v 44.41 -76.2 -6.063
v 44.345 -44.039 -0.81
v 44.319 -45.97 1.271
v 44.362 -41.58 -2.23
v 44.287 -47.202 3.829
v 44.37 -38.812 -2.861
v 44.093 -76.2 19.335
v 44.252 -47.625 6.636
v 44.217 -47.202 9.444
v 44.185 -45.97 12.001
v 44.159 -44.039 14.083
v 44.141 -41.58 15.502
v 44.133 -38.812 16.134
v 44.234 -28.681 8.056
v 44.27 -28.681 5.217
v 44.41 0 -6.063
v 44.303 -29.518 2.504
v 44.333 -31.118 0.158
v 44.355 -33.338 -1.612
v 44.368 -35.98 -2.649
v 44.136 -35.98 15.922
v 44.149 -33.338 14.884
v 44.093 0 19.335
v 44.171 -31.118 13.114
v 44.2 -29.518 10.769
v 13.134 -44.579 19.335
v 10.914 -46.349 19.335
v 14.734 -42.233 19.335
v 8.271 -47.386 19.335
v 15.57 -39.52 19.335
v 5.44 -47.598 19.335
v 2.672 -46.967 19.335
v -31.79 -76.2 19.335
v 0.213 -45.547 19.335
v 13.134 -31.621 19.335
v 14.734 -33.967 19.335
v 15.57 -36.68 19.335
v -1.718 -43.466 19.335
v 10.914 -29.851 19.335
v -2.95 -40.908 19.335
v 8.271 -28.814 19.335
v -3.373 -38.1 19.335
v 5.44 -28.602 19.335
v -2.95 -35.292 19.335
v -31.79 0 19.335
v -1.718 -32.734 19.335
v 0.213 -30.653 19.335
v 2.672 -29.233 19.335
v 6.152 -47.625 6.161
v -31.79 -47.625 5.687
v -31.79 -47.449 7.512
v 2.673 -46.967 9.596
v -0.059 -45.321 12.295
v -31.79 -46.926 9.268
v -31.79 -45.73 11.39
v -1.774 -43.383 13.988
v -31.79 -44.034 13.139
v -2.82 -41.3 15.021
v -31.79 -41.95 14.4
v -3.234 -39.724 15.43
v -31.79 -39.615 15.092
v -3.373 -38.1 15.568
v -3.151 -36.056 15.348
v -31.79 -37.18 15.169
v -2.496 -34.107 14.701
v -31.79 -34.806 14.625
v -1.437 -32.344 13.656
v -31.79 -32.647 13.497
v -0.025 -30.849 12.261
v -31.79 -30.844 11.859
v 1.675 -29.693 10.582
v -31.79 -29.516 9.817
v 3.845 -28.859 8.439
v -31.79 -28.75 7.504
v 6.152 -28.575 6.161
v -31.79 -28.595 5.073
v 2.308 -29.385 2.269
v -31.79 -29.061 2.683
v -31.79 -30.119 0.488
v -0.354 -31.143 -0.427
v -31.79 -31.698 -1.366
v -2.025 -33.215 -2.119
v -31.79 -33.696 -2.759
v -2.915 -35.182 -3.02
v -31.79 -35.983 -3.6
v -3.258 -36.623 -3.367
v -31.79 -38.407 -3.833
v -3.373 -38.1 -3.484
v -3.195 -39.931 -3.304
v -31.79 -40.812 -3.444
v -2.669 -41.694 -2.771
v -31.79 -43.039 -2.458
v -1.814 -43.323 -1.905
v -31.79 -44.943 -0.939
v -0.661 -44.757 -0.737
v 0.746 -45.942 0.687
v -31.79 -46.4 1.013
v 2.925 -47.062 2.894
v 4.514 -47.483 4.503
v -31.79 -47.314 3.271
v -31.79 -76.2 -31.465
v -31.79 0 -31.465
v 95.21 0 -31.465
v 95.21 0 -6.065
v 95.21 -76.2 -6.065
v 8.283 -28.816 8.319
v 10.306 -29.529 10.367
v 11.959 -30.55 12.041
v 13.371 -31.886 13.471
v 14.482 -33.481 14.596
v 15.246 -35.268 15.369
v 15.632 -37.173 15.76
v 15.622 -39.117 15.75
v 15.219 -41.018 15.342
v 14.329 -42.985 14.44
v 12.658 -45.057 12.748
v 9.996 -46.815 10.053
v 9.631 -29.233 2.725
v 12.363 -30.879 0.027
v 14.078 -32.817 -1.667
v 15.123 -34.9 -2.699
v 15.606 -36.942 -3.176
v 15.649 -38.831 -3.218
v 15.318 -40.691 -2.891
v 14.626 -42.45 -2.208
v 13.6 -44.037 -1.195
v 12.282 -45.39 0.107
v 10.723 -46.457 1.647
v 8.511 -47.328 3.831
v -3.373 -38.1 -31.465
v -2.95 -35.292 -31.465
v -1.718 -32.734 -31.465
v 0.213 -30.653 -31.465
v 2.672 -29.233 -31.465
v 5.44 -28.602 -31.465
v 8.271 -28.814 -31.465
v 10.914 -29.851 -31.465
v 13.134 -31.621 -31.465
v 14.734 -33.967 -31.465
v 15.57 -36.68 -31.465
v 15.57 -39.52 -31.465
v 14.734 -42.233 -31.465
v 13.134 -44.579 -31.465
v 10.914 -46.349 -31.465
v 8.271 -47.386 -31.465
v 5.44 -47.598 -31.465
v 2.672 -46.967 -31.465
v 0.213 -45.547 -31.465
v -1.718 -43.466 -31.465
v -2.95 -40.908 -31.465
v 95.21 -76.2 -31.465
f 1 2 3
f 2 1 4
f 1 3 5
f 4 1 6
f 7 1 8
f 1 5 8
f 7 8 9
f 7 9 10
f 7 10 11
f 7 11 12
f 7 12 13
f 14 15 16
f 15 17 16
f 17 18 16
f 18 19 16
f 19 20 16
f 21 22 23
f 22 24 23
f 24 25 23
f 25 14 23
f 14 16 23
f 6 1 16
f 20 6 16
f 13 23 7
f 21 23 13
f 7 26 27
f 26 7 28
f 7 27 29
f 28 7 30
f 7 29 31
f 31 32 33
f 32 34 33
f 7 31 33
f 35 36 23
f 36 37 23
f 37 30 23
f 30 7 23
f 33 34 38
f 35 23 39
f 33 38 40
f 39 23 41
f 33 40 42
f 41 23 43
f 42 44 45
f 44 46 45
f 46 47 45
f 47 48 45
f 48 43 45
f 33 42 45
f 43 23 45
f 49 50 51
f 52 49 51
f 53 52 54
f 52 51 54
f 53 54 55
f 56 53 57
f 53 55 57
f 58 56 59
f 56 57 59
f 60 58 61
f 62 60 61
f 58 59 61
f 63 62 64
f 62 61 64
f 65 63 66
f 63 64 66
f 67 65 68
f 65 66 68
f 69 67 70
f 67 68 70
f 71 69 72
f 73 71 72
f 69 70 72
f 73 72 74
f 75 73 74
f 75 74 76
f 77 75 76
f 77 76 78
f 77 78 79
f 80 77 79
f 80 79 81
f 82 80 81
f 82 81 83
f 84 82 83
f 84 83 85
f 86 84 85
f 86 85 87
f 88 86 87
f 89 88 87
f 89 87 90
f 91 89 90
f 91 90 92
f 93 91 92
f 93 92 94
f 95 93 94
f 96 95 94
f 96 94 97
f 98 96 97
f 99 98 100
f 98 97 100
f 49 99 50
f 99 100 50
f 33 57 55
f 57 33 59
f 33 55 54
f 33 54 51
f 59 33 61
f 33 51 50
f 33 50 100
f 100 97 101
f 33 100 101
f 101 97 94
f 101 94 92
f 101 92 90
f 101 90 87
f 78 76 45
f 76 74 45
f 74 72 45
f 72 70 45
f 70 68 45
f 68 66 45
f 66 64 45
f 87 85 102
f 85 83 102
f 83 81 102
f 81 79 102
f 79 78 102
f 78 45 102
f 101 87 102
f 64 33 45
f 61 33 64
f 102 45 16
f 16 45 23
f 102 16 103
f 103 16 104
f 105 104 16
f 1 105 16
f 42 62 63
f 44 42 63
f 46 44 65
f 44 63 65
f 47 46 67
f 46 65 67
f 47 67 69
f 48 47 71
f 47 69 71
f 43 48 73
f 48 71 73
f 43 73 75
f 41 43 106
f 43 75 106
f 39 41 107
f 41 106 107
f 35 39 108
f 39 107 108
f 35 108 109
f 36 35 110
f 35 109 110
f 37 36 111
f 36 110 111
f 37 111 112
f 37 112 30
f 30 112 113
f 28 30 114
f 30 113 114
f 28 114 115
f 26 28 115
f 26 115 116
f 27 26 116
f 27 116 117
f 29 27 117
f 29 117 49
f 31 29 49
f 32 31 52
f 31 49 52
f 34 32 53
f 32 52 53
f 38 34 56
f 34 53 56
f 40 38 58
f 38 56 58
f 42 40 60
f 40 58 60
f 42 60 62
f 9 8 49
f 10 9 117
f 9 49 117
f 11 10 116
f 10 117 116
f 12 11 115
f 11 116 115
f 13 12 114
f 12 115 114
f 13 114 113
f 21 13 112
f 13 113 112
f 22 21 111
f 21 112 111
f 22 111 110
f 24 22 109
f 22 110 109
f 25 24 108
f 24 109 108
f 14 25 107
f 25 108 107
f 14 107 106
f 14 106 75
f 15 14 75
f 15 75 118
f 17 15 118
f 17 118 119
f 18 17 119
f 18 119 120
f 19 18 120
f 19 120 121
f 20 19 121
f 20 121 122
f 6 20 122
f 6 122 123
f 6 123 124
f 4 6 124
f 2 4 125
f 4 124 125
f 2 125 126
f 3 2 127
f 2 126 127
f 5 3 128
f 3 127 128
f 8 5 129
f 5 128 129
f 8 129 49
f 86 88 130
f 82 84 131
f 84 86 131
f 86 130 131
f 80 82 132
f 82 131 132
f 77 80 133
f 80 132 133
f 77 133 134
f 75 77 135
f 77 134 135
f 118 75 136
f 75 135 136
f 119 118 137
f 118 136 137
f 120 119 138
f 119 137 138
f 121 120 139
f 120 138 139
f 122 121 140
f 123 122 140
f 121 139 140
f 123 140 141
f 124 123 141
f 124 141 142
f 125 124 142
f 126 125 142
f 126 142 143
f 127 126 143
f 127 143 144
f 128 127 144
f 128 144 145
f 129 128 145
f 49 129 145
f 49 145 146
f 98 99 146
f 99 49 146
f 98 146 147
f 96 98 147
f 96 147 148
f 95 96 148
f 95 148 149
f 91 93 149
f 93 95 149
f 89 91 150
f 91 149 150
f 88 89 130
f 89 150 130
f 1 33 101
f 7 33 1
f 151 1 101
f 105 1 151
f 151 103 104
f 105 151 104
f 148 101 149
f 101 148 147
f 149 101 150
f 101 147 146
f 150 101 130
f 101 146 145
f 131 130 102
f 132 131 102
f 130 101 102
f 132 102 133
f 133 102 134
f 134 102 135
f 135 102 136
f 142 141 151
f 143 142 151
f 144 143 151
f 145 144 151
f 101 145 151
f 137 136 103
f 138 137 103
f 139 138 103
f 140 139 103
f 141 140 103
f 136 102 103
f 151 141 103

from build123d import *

# Parameters (mm, degrees)
F1_DEPTH = 76.2
F3_D     = 19.05
F5_D     = 19.05


with BuildPart() as f1:
    # F0 (on Front) → F1 (new body)
    with BuildSketch(Plane.XZ):
        Polygon((-31.7896687029, 19.3352506772), (-31.7896687029, -31.4647493228), (95.2103312971, -31.4647493228), (95.2103312971, -6.0647493228), (44.4103313356, -6.062771827), (44.0933883163, 19.3352506772), align=None)
    extrude(amount=F1_DEPTH)

    # F3 (through all)
    with Locations(Plane(origin=(44.3277707348, 0, 0.5531681646), x_dir=(0, 1, 0), z_dir=(0.9999221458, 0, 0.0124780716))):
        with Locations((-38.1, 6.0835448898)):
            Hole(F3_D / 2)

    # F5 (through all)
    with Locations(Plane.XY.offset(19.3352506772)):
        with Locations((6.1518598067, -38.1)):
            Hole(F5_D / 2)


solid = f1.part
